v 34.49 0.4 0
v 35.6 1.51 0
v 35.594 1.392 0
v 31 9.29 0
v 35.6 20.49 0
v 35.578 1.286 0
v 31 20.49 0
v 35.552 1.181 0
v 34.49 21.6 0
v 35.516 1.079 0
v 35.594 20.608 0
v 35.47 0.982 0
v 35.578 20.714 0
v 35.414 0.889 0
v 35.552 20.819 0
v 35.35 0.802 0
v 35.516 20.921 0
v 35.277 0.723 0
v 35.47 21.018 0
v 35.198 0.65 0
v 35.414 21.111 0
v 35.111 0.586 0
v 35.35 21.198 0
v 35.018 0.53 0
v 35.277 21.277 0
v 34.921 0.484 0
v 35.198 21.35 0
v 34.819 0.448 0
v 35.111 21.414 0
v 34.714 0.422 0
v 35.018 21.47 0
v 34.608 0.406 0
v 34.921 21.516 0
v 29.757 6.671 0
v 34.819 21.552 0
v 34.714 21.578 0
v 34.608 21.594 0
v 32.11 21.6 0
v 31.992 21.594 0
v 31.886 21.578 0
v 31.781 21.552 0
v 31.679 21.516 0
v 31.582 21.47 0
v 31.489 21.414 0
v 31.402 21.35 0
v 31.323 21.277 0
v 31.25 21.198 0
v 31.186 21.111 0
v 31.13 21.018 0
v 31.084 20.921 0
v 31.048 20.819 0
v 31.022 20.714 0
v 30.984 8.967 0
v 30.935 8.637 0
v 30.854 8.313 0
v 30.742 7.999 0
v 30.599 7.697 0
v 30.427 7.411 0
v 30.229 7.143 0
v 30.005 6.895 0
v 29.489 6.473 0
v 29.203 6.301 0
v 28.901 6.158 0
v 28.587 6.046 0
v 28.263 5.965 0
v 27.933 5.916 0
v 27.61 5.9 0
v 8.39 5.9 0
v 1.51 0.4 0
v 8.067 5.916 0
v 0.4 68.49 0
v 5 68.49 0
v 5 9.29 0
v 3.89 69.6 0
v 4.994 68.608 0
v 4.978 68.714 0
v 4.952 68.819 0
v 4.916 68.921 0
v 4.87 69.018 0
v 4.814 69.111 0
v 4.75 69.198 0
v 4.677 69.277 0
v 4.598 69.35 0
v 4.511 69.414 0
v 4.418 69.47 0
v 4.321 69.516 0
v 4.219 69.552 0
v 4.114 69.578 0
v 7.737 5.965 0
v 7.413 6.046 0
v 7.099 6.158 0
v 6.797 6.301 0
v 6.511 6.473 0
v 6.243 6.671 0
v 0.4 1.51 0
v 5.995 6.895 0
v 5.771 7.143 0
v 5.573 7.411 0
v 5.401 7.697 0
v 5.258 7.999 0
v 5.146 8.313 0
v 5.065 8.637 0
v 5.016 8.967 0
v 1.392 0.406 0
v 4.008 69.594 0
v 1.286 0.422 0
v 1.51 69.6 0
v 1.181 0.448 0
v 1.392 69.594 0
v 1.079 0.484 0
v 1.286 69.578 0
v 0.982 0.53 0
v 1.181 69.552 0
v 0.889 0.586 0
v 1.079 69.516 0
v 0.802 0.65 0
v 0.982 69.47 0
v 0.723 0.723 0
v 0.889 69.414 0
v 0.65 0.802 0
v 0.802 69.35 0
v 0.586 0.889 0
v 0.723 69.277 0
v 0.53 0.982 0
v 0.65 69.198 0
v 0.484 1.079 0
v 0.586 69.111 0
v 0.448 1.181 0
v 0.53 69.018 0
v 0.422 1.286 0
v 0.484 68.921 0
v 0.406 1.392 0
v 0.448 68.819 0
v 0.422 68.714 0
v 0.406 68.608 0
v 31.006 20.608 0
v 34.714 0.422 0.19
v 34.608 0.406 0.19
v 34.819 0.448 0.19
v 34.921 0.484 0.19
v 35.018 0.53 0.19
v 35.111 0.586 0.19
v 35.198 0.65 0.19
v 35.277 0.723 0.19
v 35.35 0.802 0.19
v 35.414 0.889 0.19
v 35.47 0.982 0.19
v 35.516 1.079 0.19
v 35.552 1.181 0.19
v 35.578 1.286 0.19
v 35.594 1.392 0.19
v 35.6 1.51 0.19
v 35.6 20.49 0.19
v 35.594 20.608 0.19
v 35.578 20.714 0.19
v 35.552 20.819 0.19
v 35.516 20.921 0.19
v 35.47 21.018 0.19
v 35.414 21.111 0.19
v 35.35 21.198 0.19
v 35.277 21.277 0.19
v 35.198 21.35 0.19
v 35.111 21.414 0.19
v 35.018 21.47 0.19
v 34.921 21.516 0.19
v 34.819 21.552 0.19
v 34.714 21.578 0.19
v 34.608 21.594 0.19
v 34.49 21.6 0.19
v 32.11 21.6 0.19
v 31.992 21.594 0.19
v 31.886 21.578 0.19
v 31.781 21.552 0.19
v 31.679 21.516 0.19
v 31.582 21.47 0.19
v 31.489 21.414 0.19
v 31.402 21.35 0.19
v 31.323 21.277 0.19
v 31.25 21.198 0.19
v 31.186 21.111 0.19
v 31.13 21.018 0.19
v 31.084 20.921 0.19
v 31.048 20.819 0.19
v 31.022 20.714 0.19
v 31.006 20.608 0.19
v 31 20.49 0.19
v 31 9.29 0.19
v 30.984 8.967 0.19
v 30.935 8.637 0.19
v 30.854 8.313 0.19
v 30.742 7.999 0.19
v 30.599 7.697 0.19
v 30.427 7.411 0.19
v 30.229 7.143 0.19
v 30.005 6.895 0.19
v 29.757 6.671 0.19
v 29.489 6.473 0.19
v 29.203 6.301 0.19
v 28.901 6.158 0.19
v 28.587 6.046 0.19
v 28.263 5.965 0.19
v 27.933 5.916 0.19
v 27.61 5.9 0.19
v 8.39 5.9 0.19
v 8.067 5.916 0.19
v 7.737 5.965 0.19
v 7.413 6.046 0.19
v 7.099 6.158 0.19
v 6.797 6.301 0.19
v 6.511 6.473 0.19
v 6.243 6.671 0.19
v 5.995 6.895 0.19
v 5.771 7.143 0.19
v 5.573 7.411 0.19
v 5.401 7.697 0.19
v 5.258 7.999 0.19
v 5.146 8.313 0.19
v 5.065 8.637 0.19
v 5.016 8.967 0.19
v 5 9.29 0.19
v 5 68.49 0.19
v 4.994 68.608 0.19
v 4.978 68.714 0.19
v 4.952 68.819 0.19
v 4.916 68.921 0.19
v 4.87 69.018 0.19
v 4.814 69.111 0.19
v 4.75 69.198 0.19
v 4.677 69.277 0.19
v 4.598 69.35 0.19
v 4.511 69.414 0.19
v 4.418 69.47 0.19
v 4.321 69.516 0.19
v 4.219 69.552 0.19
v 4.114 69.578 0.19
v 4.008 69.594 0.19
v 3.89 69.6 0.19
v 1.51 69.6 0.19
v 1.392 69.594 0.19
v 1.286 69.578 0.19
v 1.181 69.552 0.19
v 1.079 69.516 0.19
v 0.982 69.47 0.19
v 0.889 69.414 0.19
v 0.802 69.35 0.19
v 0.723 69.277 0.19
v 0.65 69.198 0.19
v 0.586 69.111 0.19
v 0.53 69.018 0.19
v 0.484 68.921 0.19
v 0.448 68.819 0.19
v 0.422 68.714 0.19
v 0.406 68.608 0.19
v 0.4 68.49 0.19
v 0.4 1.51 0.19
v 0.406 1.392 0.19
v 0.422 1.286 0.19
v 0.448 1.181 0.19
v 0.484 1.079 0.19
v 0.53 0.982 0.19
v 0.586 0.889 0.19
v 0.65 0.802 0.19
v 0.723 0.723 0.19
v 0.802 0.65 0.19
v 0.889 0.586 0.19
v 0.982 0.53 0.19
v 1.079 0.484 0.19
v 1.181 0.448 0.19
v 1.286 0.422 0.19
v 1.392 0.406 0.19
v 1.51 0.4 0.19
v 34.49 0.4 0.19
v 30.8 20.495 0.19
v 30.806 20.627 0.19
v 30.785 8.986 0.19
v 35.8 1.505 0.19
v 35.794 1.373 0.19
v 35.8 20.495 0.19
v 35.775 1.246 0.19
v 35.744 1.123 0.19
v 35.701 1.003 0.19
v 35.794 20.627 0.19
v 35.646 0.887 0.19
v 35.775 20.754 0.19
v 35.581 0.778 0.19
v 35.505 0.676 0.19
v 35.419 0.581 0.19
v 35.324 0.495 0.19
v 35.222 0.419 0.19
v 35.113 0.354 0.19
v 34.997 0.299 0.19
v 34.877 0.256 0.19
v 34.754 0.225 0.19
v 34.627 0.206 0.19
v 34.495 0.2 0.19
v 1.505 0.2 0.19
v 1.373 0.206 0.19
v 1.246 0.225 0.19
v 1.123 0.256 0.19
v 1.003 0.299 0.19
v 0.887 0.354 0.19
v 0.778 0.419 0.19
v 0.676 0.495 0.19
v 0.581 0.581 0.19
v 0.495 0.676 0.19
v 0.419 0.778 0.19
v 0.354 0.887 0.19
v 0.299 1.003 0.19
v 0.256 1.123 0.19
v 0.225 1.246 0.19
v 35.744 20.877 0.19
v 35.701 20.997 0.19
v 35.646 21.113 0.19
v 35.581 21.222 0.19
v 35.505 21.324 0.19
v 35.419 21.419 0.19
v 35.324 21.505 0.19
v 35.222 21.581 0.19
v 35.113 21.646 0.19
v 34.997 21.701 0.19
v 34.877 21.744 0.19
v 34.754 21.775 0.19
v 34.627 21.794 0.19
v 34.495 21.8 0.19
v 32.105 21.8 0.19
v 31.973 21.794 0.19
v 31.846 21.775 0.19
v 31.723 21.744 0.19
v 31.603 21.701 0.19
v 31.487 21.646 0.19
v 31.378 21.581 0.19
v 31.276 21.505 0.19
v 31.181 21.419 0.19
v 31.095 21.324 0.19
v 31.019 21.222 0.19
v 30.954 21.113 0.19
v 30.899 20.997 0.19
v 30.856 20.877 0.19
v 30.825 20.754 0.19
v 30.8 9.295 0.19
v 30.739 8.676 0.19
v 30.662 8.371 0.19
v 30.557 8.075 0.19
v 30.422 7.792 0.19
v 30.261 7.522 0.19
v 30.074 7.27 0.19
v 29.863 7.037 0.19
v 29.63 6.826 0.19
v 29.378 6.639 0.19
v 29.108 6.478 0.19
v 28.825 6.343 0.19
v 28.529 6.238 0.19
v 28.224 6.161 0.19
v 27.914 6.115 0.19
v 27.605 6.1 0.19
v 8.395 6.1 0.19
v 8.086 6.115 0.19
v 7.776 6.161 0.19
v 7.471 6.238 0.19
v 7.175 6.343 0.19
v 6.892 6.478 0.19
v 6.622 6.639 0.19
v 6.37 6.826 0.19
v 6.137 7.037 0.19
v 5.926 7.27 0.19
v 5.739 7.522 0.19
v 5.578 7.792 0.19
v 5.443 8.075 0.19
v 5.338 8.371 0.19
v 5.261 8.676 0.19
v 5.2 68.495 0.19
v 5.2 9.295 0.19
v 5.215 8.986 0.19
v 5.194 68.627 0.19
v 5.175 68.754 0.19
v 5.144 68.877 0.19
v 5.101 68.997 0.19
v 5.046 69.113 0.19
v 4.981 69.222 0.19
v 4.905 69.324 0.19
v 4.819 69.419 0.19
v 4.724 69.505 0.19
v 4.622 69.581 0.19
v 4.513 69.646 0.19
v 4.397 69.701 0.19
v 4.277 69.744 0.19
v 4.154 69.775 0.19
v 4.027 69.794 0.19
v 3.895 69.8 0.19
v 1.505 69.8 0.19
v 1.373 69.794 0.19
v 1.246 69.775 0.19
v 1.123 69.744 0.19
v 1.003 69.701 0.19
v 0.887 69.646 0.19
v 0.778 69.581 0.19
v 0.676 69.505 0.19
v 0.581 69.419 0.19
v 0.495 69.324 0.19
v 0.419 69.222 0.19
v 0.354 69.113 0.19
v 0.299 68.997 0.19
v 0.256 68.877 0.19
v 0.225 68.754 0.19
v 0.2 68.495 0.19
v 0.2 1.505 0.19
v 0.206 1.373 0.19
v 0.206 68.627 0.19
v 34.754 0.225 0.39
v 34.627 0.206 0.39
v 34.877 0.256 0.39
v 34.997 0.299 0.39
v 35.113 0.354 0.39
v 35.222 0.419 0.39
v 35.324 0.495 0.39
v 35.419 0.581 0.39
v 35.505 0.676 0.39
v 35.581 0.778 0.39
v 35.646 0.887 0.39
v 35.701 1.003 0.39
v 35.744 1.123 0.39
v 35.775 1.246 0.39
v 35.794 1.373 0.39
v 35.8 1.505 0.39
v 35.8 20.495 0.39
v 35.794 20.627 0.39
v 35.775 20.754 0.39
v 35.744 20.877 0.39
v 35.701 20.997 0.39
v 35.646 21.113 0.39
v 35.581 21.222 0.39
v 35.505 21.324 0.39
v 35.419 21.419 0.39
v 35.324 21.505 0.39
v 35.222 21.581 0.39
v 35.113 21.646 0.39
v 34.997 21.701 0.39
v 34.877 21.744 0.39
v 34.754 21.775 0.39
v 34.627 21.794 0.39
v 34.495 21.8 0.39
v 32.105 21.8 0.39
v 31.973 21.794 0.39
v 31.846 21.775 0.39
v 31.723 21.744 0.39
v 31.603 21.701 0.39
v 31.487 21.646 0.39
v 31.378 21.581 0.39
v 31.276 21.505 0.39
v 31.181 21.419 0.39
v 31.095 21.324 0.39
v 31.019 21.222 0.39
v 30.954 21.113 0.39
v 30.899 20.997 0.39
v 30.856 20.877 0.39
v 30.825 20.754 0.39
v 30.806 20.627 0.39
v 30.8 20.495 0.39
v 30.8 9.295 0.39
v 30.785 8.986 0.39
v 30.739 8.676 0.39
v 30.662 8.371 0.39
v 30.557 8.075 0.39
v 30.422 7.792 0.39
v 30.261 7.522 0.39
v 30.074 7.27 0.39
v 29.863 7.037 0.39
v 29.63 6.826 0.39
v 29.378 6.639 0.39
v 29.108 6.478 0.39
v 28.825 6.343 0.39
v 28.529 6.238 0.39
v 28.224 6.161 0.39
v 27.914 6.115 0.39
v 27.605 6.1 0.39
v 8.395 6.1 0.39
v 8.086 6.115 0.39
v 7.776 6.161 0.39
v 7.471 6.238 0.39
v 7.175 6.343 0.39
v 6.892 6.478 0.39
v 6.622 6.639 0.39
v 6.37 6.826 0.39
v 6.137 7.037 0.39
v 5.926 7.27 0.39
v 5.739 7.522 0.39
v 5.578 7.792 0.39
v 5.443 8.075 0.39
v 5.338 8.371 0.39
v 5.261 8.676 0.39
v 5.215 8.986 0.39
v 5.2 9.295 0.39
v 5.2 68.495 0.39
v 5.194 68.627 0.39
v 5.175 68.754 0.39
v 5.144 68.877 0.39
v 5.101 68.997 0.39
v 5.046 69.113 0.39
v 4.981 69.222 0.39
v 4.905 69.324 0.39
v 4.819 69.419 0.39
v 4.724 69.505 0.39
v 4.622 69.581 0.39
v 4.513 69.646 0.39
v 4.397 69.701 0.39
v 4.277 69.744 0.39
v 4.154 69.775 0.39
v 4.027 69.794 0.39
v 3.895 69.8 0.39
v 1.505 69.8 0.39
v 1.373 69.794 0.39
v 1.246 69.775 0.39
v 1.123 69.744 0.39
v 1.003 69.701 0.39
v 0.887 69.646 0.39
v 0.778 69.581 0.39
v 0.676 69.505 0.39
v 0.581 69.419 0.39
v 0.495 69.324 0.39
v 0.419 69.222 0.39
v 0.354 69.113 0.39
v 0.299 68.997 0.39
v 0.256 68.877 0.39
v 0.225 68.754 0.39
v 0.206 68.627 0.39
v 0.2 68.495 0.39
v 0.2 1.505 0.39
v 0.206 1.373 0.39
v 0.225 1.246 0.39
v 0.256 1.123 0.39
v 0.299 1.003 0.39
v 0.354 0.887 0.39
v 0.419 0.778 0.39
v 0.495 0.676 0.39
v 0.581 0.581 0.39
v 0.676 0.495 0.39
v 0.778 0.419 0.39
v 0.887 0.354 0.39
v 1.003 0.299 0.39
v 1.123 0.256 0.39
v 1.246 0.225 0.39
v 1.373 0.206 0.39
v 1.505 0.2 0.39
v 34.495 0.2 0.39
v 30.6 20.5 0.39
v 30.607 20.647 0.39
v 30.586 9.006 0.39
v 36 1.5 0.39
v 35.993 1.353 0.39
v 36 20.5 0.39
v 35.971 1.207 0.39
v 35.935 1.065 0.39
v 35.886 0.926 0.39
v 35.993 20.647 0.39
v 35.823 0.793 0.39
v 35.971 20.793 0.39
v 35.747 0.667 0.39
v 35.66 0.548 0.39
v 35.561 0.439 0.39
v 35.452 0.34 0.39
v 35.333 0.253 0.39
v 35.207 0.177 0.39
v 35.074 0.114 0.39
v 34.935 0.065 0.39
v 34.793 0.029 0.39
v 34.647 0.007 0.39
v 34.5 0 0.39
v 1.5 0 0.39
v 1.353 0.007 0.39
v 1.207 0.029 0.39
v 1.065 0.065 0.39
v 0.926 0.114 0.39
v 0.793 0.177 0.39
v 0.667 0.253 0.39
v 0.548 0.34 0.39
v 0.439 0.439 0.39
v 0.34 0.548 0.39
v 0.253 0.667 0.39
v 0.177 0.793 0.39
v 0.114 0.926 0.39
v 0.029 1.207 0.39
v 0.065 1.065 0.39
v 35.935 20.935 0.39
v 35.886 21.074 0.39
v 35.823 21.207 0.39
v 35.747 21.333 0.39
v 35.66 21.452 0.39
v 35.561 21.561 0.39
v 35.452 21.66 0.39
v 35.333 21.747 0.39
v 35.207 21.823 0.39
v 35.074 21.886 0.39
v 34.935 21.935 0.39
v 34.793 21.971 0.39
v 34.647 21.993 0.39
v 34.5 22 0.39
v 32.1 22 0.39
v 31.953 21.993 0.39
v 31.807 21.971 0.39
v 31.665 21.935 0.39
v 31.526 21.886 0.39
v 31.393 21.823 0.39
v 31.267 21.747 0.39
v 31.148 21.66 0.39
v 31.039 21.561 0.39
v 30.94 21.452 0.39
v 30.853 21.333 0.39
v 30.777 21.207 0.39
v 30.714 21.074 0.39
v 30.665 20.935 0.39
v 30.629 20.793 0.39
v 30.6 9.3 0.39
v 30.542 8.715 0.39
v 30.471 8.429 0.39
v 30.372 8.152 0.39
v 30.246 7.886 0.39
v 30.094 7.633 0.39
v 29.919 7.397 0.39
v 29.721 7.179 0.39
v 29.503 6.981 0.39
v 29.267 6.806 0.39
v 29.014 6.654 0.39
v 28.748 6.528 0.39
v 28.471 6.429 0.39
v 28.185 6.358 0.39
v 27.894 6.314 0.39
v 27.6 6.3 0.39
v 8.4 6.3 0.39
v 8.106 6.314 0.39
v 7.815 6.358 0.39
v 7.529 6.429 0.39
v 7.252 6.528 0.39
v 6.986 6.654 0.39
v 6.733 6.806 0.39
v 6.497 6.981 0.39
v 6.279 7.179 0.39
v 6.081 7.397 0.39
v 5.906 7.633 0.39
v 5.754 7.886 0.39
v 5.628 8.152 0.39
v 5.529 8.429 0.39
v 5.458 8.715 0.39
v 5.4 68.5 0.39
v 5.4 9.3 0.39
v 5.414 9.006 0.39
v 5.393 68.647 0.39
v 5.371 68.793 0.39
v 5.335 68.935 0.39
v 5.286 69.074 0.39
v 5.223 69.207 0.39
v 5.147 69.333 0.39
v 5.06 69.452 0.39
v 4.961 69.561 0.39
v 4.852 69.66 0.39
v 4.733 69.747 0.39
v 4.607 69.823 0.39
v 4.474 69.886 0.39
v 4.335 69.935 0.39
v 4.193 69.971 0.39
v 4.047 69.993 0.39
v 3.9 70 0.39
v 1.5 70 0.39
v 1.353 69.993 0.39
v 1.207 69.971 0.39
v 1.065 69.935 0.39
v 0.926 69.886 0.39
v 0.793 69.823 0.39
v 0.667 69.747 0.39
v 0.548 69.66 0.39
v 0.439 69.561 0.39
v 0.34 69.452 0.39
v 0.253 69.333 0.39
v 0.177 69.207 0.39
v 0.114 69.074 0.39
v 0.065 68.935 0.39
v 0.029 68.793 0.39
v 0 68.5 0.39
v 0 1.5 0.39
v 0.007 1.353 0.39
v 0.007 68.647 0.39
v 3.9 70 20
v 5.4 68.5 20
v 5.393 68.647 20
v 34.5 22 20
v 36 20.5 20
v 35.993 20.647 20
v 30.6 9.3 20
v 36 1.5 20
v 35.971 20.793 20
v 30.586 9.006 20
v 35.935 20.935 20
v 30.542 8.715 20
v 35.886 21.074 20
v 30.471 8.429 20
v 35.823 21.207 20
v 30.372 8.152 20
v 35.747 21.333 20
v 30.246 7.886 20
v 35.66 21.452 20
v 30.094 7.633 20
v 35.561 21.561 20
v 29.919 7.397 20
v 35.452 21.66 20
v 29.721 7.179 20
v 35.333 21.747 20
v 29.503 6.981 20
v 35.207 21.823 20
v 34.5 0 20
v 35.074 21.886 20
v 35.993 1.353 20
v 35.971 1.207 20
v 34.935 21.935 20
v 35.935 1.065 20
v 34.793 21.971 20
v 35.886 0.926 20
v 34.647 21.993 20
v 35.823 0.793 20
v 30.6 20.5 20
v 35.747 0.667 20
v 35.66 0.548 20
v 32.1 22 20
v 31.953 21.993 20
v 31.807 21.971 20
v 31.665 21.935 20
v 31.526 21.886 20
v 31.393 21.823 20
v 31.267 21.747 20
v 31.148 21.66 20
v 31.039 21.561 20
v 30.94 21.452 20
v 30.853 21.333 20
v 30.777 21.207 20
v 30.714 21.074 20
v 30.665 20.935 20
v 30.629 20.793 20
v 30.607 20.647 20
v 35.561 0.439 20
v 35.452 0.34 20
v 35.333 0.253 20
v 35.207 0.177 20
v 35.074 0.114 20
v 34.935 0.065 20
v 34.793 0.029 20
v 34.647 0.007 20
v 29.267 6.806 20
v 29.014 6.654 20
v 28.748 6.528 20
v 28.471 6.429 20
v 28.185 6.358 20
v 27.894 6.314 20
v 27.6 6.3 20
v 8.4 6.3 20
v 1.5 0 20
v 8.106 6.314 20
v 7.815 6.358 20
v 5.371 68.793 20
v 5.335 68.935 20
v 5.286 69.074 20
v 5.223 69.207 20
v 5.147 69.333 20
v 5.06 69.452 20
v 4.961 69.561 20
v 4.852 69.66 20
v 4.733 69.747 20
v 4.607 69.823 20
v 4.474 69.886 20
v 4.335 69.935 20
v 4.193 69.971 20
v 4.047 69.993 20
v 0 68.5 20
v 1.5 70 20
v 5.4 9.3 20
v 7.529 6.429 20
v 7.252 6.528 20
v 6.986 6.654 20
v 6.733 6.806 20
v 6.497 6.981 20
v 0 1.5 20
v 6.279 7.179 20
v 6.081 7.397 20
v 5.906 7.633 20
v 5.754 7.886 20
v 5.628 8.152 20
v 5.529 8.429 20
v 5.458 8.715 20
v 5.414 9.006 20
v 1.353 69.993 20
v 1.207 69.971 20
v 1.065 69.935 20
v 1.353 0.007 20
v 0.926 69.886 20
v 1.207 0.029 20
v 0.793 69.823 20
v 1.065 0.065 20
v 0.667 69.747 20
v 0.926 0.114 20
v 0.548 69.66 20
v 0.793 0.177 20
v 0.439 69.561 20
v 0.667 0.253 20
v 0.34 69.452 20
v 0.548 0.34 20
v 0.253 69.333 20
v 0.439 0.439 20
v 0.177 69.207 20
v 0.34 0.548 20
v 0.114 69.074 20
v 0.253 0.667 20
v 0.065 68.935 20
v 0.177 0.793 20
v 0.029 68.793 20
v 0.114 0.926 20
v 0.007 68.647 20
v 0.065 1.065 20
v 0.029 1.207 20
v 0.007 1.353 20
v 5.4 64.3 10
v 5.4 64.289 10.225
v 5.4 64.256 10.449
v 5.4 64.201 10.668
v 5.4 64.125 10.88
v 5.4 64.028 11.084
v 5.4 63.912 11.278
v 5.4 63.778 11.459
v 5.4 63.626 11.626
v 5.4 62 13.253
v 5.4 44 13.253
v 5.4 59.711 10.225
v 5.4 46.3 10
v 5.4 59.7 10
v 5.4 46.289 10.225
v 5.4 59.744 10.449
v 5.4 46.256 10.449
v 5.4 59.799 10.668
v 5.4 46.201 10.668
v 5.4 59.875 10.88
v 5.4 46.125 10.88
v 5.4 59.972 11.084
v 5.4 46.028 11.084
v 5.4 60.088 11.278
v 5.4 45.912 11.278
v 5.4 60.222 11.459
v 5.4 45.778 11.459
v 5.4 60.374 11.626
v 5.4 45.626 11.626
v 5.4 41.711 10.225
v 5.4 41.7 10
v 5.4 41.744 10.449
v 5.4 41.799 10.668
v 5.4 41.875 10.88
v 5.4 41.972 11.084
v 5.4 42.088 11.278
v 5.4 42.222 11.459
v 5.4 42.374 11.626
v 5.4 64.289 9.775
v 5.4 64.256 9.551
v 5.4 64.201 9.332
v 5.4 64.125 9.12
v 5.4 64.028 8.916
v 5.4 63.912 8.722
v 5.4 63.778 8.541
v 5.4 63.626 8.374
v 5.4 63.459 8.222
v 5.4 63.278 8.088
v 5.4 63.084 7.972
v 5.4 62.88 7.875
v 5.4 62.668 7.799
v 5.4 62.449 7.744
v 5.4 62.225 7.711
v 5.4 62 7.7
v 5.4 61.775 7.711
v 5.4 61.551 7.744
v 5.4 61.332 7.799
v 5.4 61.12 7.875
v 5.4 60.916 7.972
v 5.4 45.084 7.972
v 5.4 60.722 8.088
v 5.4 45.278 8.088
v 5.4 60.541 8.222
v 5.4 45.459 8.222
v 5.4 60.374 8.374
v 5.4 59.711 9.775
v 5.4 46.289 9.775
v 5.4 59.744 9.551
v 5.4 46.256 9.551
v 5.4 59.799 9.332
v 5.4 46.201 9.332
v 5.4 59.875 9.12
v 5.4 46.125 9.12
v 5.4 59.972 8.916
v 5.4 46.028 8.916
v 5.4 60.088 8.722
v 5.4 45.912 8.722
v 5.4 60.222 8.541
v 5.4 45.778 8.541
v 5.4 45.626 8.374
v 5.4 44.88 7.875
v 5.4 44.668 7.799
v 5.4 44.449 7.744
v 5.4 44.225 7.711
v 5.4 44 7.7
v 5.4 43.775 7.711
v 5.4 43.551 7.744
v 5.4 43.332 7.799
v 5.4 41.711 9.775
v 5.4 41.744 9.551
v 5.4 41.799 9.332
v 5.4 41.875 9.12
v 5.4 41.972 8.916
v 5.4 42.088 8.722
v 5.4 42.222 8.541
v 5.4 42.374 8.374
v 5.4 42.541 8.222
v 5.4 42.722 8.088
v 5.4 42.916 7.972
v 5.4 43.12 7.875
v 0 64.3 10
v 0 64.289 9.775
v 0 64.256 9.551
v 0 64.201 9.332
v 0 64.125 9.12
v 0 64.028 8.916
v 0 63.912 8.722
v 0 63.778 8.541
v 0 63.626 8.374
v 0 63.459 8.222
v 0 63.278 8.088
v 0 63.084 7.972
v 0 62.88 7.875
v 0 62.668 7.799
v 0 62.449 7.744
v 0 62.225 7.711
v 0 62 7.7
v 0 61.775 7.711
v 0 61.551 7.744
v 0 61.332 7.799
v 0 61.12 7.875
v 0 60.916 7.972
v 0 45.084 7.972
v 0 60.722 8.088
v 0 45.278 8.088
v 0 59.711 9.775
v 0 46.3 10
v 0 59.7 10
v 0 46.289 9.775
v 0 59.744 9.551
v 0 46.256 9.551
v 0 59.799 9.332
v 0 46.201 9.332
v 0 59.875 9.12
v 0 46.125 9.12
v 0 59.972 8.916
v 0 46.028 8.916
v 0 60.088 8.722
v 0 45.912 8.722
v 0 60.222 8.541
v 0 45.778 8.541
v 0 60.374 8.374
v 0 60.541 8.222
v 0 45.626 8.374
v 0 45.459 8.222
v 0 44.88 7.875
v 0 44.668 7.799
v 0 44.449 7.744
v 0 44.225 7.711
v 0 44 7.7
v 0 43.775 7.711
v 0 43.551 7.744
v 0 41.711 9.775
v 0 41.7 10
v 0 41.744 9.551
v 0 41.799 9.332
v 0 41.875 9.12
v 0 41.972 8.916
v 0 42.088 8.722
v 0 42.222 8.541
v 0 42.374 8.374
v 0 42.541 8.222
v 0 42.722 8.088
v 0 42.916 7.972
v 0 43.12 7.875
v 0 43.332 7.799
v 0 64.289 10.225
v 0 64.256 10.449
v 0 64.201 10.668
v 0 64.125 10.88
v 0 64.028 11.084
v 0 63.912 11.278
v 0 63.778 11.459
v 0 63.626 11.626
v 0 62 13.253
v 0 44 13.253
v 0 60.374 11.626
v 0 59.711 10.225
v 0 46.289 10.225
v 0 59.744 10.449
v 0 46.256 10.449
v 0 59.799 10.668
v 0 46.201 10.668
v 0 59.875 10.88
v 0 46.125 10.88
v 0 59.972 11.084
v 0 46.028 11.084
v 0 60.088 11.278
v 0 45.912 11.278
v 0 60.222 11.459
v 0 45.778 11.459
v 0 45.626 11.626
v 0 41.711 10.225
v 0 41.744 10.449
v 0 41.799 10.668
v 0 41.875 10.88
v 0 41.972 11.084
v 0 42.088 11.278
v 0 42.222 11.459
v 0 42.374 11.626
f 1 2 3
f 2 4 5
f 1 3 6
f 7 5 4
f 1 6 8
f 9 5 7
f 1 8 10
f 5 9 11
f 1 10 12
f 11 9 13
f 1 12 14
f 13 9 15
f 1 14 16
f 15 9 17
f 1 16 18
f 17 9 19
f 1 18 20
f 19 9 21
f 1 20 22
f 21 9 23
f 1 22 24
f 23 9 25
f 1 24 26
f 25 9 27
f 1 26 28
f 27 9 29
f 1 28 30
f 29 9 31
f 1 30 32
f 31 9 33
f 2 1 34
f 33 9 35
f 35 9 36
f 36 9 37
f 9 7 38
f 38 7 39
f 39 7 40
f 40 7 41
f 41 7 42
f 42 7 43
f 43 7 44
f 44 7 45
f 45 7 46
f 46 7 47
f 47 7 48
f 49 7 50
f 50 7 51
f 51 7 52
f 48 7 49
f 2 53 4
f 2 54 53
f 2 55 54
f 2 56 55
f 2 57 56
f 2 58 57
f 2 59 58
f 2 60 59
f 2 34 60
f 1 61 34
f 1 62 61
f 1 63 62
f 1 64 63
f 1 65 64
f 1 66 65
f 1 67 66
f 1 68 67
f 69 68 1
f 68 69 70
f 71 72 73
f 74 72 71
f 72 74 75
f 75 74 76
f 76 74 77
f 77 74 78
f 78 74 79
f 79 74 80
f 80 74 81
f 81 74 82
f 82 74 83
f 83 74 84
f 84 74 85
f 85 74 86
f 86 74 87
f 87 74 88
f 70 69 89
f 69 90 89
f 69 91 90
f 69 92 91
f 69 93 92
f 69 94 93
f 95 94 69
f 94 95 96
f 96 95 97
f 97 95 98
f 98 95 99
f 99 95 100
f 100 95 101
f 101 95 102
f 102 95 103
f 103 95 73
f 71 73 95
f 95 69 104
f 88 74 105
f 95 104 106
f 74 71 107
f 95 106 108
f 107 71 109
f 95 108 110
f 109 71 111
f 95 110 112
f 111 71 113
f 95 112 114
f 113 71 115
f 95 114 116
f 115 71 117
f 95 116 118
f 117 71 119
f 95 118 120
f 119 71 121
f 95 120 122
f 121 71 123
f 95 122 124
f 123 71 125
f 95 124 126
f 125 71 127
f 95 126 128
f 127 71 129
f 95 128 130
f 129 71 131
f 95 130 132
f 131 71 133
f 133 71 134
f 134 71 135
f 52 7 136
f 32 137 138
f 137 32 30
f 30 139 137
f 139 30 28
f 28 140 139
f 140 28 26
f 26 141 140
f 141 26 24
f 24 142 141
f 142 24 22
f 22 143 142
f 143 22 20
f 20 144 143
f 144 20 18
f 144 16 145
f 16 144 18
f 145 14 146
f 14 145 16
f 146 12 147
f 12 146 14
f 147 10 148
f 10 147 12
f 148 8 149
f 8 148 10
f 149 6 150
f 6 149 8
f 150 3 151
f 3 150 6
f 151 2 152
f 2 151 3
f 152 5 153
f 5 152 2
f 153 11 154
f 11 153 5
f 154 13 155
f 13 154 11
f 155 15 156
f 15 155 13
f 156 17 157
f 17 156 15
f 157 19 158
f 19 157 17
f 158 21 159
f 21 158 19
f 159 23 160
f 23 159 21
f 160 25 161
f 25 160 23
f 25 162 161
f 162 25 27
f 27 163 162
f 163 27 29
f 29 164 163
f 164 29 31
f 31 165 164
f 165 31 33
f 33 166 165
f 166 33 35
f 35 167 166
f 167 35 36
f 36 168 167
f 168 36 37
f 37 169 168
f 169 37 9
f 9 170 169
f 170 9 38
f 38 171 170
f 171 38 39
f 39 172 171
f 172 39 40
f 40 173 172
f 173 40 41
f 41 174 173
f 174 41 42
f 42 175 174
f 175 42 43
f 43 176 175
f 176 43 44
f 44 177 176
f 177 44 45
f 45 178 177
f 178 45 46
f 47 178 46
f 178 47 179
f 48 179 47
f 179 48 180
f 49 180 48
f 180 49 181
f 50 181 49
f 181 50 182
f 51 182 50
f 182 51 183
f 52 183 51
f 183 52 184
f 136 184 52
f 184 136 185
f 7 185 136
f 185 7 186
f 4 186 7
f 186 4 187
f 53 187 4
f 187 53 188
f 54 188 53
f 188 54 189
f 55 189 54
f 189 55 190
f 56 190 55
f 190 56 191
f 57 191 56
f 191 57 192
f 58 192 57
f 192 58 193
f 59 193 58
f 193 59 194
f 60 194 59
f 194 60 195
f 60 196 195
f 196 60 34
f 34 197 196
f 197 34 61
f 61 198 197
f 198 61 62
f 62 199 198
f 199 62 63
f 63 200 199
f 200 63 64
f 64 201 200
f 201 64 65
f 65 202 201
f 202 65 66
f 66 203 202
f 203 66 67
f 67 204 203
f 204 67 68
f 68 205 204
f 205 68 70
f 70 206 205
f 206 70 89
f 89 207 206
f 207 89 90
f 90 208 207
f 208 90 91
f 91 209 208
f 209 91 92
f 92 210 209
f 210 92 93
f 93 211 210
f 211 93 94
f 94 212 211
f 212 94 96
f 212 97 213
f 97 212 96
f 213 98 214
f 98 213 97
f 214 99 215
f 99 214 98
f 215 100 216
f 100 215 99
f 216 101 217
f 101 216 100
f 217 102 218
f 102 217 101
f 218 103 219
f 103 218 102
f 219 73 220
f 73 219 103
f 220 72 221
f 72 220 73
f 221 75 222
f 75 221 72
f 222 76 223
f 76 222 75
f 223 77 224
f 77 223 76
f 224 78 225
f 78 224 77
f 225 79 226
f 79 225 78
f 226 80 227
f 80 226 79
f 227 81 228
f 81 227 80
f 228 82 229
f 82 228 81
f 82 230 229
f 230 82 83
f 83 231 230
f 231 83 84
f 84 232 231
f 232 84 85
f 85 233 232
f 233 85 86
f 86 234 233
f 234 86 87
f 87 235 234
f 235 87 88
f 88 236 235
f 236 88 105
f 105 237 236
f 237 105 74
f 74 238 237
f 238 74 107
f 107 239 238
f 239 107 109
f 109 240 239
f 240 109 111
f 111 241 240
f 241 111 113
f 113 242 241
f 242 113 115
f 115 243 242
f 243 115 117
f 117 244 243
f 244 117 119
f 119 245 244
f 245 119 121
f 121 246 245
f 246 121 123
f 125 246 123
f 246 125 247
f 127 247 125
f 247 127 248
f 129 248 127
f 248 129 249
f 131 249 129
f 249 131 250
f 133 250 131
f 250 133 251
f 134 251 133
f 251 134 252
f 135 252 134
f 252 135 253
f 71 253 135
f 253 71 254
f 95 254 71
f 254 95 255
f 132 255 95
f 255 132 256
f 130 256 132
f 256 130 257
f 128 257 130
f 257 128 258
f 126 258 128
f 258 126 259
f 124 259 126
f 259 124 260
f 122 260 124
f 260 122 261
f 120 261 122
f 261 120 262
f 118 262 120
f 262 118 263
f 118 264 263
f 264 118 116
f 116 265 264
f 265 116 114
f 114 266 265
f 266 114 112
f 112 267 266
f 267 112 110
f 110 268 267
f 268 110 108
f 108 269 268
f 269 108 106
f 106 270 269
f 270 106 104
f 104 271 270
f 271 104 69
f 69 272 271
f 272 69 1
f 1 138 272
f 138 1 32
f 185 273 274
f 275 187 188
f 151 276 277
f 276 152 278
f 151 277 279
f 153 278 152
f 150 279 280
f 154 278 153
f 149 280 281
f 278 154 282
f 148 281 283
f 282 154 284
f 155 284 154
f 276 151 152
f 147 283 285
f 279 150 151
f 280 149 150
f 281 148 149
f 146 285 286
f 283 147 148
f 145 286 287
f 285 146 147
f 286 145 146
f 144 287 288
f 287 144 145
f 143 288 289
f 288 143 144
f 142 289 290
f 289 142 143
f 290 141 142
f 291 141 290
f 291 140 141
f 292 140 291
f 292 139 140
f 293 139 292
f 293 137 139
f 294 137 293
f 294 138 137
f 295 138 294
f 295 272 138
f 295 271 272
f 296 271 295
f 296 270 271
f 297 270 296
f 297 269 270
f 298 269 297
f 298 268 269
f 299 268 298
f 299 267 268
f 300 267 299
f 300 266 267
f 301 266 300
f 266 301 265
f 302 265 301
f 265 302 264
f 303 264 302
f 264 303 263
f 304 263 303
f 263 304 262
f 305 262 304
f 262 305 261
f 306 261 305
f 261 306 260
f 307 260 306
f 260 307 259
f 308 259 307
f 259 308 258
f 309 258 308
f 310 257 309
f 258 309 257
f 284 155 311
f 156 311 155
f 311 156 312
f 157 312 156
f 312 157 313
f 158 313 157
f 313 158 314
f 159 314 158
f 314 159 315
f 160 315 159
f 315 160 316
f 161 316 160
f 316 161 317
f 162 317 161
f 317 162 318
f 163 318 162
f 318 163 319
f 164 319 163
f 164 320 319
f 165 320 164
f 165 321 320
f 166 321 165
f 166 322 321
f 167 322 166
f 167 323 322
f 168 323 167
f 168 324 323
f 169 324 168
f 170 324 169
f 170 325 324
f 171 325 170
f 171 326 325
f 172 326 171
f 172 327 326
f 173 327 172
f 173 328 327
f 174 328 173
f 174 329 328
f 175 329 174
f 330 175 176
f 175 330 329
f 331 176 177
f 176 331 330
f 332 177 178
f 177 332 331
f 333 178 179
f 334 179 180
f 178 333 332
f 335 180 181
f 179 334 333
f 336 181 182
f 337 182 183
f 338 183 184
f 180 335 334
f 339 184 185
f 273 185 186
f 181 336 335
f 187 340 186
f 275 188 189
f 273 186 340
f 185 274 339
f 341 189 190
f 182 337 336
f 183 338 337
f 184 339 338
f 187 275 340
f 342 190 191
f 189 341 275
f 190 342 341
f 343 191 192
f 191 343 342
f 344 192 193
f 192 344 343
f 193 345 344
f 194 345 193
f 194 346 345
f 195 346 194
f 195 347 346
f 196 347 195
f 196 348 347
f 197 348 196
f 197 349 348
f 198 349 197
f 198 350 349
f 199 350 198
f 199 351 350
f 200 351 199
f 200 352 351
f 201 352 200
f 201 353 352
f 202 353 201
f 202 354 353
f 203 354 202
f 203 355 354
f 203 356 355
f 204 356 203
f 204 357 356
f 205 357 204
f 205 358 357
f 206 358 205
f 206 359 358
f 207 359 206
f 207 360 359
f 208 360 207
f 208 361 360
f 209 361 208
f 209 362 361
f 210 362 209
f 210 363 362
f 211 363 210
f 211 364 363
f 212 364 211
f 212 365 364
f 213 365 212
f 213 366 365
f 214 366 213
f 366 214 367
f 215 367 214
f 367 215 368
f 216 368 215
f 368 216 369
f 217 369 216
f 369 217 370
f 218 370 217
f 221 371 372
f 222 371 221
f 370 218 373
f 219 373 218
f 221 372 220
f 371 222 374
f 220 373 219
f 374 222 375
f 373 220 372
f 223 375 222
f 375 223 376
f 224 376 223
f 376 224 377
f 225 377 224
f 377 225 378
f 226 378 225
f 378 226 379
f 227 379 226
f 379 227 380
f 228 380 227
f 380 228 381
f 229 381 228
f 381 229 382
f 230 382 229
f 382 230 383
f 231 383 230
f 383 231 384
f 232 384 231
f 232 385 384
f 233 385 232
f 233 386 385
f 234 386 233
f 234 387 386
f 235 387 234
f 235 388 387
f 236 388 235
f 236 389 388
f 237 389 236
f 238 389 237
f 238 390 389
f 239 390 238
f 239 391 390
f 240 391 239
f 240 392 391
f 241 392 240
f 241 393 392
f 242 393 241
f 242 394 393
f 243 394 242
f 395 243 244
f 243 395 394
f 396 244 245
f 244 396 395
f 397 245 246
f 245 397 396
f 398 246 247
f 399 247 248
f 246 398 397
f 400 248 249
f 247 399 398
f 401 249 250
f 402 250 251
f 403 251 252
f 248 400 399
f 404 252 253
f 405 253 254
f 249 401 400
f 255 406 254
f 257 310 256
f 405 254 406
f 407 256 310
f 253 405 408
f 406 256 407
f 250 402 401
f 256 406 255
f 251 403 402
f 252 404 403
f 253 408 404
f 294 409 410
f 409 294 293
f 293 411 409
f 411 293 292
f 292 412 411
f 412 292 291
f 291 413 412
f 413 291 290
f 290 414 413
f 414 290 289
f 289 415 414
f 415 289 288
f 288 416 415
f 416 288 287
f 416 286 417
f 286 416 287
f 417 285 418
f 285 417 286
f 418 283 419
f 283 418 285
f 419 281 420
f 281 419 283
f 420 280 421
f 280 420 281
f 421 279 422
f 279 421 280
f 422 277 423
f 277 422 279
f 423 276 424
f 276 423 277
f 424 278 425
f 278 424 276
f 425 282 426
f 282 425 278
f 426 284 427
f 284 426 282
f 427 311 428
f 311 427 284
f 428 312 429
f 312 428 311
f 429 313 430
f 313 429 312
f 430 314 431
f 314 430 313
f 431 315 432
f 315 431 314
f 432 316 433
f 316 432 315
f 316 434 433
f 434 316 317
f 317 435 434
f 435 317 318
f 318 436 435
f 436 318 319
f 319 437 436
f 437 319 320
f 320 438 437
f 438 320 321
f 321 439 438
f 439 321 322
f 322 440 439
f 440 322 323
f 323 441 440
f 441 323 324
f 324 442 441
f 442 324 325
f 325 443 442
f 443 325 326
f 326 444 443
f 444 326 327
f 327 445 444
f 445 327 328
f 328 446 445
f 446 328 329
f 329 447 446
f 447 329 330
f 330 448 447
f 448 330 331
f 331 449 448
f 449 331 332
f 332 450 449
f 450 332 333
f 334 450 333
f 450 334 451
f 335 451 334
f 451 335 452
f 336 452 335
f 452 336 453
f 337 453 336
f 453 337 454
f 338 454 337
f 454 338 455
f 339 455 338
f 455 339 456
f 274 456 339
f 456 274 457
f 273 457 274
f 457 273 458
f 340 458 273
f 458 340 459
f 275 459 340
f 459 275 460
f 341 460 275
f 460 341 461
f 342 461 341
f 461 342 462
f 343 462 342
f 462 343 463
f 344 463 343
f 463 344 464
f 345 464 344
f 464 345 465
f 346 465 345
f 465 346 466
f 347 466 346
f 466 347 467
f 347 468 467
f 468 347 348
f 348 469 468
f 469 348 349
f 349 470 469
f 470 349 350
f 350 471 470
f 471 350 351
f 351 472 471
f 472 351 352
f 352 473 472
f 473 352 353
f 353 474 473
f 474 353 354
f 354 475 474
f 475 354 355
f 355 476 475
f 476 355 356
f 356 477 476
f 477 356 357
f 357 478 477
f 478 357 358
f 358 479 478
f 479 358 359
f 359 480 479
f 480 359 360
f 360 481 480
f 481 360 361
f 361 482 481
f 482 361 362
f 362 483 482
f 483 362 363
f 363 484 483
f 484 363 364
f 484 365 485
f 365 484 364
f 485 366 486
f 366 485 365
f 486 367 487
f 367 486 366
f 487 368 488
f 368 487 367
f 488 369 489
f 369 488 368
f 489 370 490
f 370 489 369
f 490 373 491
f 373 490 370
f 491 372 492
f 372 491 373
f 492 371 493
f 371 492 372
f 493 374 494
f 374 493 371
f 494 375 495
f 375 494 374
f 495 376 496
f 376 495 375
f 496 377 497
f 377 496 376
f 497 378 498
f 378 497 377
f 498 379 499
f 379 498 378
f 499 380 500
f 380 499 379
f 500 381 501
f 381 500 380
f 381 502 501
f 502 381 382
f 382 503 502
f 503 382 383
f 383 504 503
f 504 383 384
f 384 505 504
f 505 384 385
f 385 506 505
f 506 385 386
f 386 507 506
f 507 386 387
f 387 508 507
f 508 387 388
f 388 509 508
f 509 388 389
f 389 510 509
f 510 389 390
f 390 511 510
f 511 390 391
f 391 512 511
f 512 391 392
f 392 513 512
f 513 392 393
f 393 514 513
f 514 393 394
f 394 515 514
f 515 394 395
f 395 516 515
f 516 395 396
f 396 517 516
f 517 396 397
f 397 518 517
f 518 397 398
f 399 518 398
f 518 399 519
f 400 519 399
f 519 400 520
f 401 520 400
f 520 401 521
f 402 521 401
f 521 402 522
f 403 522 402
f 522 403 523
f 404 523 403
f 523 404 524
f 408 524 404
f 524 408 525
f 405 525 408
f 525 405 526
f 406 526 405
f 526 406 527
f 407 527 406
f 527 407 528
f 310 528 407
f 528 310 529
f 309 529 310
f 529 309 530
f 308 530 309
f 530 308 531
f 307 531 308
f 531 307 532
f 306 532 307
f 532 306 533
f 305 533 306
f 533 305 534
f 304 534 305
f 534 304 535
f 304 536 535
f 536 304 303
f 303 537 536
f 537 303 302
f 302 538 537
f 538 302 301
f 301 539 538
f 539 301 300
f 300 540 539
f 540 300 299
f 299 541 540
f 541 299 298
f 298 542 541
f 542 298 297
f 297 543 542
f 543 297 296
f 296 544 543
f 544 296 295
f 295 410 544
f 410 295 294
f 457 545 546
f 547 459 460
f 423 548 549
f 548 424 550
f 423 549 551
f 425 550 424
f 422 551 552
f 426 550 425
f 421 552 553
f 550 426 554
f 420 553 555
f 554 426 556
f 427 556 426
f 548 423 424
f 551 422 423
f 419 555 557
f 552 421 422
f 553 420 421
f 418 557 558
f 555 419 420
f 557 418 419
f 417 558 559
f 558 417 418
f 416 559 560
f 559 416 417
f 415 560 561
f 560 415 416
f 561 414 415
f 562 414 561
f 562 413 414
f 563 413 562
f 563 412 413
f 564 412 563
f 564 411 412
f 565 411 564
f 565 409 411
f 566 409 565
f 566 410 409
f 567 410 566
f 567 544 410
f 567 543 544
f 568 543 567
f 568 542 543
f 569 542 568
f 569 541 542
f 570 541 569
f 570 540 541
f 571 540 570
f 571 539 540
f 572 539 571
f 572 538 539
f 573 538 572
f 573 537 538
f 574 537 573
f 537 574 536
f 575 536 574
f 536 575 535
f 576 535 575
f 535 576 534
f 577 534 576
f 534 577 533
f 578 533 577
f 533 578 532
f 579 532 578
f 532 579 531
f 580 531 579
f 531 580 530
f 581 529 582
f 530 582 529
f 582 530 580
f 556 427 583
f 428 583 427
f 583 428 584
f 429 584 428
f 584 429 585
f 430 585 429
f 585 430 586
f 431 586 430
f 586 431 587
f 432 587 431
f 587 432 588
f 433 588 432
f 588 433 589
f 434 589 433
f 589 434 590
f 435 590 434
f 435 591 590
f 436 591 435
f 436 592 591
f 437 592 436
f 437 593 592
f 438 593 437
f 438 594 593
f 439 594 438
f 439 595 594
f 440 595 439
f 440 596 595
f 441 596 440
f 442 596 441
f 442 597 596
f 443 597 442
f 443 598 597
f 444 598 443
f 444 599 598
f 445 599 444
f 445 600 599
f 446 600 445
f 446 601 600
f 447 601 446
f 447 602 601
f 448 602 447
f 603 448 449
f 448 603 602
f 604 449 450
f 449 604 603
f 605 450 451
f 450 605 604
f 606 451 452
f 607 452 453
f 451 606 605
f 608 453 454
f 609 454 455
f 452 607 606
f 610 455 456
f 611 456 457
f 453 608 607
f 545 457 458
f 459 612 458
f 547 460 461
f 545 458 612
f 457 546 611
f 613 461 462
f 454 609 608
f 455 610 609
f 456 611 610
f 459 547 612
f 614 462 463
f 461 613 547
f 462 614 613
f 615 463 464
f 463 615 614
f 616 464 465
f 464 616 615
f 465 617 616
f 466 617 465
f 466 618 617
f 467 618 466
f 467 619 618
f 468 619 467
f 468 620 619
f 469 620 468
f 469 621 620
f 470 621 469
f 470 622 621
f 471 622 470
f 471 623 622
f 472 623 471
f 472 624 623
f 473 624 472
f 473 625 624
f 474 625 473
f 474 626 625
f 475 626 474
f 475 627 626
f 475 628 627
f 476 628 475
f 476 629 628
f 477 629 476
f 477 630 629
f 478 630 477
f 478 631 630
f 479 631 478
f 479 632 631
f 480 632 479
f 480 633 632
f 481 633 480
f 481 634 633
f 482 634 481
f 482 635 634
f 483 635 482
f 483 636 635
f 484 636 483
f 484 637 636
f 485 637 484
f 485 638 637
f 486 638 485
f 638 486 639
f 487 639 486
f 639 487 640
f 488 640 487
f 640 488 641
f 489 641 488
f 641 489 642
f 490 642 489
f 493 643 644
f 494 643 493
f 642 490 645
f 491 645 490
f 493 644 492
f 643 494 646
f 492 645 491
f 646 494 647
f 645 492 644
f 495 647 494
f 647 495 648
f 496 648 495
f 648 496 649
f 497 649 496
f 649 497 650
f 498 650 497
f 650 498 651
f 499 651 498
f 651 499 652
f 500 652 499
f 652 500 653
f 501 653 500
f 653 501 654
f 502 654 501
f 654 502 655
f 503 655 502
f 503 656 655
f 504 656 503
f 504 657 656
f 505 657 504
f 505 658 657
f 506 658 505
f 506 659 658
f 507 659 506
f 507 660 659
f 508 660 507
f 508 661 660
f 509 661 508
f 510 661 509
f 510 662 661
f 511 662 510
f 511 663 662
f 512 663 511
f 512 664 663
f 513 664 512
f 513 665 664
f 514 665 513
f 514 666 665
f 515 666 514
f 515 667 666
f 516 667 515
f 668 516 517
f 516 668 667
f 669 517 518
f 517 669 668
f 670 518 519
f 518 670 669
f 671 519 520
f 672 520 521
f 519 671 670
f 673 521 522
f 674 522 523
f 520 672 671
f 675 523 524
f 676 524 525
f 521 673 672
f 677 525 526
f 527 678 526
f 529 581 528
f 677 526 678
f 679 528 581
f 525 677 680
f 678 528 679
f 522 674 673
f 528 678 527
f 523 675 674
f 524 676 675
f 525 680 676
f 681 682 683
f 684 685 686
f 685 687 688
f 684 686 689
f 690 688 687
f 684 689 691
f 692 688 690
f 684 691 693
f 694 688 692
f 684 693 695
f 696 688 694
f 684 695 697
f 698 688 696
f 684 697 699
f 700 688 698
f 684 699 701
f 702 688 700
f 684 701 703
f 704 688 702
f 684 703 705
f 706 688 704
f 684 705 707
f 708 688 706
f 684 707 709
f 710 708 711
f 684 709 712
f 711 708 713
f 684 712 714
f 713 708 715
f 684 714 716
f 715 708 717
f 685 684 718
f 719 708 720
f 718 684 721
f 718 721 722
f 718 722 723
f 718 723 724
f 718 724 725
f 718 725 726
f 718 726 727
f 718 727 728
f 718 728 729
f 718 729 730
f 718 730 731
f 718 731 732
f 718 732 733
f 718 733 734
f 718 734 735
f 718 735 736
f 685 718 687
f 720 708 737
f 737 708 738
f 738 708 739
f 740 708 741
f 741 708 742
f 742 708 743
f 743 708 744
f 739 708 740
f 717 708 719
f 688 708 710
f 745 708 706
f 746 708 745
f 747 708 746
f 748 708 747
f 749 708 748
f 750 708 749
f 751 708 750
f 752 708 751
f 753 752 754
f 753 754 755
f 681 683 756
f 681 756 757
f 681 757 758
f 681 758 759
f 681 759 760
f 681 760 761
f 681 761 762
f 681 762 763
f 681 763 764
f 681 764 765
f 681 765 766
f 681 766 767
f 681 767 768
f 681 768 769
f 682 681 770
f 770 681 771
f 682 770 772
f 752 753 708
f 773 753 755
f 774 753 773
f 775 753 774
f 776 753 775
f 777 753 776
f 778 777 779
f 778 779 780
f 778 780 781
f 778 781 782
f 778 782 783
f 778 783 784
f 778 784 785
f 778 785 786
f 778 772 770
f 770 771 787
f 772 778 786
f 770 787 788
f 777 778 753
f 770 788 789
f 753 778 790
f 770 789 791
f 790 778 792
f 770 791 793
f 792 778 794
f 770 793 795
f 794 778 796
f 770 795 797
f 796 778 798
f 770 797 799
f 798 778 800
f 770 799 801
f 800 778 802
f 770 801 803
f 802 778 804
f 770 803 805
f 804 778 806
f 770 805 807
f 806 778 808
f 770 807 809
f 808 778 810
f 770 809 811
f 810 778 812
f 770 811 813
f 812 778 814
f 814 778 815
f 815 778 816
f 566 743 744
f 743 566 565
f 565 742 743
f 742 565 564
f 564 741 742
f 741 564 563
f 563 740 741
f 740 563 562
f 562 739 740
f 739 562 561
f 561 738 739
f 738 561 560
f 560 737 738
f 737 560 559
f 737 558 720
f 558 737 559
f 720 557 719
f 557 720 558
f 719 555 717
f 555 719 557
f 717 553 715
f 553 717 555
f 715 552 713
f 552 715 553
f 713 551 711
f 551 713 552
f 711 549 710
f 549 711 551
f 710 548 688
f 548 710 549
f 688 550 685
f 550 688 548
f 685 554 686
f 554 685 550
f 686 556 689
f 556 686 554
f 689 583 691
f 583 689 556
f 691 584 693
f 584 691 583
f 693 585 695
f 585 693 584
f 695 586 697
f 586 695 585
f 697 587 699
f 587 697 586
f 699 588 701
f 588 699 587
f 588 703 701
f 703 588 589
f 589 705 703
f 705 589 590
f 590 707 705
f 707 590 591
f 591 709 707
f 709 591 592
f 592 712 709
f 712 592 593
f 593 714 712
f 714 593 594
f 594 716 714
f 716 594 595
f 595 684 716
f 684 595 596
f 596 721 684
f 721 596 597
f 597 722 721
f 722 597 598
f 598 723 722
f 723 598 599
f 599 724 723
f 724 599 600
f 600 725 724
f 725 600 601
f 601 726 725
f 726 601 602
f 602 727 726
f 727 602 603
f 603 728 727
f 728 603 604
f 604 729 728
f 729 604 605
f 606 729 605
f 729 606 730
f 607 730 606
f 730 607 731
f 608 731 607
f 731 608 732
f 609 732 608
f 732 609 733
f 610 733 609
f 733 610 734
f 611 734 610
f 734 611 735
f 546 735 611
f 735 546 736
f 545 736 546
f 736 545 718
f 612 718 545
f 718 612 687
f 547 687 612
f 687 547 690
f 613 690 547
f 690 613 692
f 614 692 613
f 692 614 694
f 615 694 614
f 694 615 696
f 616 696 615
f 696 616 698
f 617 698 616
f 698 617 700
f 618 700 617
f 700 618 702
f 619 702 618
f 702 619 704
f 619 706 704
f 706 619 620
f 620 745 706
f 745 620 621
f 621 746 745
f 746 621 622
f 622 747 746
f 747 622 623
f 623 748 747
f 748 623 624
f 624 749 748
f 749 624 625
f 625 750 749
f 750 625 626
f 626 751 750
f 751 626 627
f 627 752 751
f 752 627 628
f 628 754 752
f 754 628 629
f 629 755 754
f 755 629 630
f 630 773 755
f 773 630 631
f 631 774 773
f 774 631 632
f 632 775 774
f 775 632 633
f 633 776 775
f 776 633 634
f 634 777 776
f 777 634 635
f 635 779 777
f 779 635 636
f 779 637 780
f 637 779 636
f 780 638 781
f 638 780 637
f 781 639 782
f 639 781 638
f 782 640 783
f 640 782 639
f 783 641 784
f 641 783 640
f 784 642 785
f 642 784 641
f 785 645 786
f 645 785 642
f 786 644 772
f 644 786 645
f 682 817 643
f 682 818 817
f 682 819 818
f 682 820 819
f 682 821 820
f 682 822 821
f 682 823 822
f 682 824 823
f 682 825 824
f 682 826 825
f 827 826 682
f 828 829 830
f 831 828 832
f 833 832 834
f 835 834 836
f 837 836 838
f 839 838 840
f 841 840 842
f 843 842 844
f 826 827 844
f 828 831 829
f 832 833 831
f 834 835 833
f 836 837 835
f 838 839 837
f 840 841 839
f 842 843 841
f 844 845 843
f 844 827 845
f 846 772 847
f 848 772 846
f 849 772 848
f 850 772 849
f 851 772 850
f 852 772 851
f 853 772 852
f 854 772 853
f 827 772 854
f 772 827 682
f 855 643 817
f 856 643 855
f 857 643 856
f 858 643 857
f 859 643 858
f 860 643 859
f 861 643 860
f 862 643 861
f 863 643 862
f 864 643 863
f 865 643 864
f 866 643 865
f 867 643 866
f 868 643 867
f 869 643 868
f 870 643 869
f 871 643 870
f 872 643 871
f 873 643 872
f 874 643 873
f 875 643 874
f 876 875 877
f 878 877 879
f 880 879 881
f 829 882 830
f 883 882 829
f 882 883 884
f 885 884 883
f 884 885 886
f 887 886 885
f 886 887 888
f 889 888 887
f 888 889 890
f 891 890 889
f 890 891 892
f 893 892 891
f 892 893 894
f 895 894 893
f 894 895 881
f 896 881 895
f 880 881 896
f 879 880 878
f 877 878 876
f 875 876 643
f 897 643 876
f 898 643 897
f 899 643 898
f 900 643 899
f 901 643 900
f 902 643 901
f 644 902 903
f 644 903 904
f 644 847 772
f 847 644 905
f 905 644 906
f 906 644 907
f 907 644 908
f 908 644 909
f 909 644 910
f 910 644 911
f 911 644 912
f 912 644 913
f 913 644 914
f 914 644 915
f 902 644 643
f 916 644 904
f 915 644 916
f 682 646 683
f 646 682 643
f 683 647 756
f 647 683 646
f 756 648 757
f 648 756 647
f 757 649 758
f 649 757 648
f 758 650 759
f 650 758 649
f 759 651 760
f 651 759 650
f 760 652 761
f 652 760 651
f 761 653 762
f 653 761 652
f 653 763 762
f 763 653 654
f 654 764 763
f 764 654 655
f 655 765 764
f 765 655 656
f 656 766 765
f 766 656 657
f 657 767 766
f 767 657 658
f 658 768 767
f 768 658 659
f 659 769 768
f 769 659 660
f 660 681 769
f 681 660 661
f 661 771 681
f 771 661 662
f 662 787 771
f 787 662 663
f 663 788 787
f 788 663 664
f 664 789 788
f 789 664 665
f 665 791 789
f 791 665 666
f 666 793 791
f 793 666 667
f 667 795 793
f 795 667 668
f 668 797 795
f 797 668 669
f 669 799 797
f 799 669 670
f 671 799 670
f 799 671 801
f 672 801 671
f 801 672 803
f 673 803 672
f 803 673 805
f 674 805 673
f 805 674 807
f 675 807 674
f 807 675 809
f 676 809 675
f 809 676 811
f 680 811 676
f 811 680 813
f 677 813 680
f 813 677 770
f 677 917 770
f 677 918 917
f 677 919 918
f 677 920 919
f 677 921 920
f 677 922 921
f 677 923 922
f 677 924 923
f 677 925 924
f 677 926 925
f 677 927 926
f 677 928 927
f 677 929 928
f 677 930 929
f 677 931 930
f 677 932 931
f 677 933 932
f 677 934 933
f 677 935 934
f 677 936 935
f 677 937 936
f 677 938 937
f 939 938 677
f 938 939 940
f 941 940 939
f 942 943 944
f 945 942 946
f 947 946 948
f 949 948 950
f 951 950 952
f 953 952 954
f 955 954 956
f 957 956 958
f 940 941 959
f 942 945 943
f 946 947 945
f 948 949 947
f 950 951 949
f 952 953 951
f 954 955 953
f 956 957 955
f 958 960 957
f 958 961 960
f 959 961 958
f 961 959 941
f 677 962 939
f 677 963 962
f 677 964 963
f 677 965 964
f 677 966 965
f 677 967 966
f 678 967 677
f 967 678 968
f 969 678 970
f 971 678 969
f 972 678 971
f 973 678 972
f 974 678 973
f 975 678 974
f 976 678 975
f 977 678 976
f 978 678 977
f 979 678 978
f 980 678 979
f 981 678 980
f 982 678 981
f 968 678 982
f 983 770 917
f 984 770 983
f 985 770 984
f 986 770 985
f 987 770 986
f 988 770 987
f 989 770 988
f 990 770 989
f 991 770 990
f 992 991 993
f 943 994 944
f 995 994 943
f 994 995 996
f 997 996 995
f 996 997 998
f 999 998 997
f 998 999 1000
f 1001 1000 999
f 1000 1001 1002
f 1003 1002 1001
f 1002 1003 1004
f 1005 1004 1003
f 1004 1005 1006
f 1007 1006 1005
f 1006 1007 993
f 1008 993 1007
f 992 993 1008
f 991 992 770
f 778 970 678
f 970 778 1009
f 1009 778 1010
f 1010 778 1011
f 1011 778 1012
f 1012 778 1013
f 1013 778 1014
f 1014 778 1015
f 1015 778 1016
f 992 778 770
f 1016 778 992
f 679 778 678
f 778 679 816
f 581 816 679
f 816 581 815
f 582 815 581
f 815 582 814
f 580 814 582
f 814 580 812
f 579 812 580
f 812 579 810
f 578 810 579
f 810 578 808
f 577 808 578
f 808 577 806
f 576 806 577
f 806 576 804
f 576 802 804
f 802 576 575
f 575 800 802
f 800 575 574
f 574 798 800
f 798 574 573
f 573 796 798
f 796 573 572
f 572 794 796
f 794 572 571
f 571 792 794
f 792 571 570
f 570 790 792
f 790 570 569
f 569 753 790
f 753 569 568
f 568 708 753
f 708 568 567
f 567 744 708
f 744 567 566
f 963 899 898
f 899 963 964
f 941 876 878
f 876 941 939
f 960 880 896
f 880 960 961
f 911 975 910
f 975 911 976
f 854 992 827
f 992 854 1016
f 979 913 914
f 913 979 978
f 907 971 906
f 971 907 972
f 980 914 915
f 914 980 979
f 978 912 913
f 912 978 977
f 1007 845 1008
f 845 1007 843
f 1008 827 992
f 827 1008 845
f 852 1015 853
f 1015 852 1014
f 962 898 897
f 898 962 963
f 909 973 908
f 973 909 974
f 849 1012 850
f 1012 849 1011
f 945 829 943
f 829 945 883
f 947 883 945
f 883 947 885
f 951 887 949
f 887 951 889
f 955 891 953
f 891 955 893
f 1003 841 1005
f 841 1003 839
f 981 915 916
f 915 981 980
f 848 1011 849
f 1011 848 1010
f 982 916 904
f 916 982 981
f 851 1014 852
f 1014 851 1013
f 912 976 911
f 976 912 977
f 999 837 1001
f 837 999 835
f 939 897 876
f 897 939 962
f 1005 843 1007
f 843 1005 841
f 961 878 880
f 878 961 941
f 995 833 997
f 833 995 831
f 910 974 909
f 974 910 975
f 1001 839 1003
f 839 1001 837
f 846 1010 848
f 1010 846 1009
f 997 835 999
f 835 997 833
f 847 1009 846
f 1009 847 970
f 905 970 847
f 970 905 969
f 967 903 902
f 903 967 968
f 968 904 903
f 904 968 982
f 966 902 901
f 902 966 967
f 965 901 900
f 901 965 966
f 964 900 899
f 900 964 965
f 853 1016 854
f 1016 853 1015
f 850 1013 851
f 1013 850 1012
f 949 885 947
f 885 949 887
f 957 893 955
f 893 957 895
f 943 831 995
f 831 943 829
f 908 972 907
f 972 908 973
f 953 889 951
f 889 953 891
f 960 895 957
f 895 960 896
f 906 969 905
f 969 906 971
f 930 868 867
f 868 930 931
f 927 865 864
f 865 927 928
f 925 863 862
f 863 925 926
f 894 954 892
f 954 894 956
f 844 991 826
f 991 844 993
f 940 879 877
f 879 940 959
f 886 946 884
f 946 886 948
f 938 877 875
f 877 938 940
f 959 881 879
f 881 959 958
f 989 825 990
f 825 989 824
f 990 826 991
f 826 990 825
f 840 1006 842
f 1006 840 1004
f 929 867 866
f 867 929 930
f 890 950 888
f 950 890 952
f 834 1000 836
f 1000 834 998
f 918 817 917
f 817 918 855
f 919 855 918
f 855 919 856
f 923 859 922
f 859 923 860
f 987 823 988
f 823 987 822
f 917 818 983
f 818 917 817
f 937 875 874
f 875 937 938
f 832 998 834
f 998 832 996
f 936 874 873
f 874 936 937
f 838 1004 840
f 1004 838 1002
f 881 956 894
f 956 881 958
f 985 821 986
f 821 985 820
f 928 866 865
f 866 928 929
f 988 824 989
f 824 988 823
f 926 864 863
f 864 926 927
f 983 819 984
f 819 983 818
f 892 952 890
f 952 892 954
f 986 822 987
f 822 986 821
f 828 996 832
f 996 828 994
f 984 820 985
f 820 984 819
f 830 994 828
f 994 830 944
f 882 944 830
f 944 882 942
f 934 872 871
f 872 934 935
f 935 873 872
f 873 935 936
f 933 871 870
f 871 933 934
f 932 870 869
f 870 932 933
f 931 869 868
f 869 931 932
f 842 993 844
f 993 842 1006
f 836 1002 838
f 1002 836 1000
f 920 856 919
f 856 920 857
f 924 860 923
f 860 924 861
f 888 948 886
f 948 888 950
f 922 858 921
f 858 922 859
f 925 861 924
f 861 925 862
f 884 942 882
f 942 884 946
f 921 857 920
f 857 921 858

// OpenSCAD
// === DESCRIPTION ===
// Coat hook: a single J-hook screwed to a wall for a heavy winter coat or a bag
// (up to about 3 kg hanging at the hook).
// Physical context: indoors, fixed to a stud with two 4 mm pan-head wood screws.
//   The load hangs in the hook's curve and bends the arm; the back plate presses
//   against the wall below and the top screw carries the pull-out load.
//
// Design decisions:
//   - Printed lying on its side: the hook's side profile is extruded along Z, so
//     the arm bends within the layer plane (along the layers), not across them.
//   - Screw holes are horizontal in this orientation, so they are teardrops with
//     the point up, sized 4 mm + 0.3 compensation + 0.3 free fit.
//   - Inside corners have 3 mm fillets and outside corners 1.5 mm rounds.
//   - The first 0.4 mm is inset in two steps for elephant-foot compensation.
//
// Terminology → code:
//   "back plate"   → plate_t, plate_h, profile()
//   "arm"          → arm_len, arm_t
//   "tip"          → tip_h, tip_t
//   "screw holes"  → screw_d, screw_y, teardrop_hole()
//   "hook width"   → hook_w
//
// Common modifications:
//   Wider hook       → hook_w
//   Heavier load     → arm_t (check bend_stress assert)
//   Deeper hook      → arm_len
//
// Overall dimensions: 36 x 70 x 20 mm (fits a Bambu P1S, 256^3)
// Coordinate system: X = out from the wall, Y = up the wall in use, Z = hook width
// NOTE: Model is in print orientation (on its side). In use, Y is vertical.

// === PRINT SETTINGS ===
// Material: PETG (tough; little creep at room temperature under a 3 kg load)
// Layer Height: 0.2mm
// Walls/Perimeters: 4 (1.8mm)
// Infill: 40% gyroid
// Supports: None required (teardrop holes, profile extruded straight up)
// Orientation: As modeled, lying on its side
// Notes: Dry PETG first; set slicer elephant-foot compensation to 0 (modelled in)

// === PARAMETERS ===
nozzle_diameter = 0.4;
layer_height = 0.2;

hook_w = 20;          // hook width (print Z)
plate_h = 70;         // back plate height
plate_t = 5.4;        // back plate thickness (12 extrusion widths)
arm_len = 36;         // hook depth out from the wall
arm_t = 6.3;          // arm thickness (14 extrusion widths)
tip_h = 22;           // tip height
tip_t = 5.4;          // tip thickness
screw_nominal = 4;    // wood screw size
screw_y = [44, 62];   // screw heights
fillet_r = 3;         // inside corner fillet
round_r = 1.5;        // outside corner round
load_kg = 3;          // design load at the hook

// === DERIVED CONSTANTS ===
extrusion_width = nozzle_diameter * 1.125;
fudge = 0.01;
hole_comp = 0.3;                                    // measured hole compensation
screw_d = screw_nominal + hole_comp + 0.3;          // free-running clearance
ef_chamfer = 0.4;
bend_stress = (load_kg * 9.81 * arm_len) / (hook_w * arm_t * arm_t / 6);   // MPa at the arm root
$fn = $preview ? 32 : 64;

assert(abs(plate_t / extrusion_width - round(plate_t / extrusion_width)) < 1e-6, "plate is whole perimeters");
assert(abs(arm_t / extrusion_width - round(arm_t / extrusion_width)) < 1e-6, "arm is whole perimeters");
assert(bend_stress < 12, "arm root stress stays well under PETG's ~50 MPa");
assert(screw_y[0] - screw_d / 2 > arm_t + fillet_r + 5, "screws clear the arm");
echo(bend_stress_MPa = bend_stress, screw_d = screw_d);

// === MODULES ===
module teardrop_hole(d, h, axis = "y") {
    r = d / 2;
    rotate([0, 0, axis == "x" ? 90 : 0]) rotate([90, 0, 0])
        linear_extrude(height = h, center = true)
            union() { circle(r = r); rotate(45) square(r); }
}

module raw_profile()
    union() {
        square([plate_t, plate_h]);                                // back plate
        square([arm_len, arm_t]);                                  // arm
        translate([arm_len - tip_t, 0]) square([tip_t, tip_h]);    // tip
    }

module profile()
    offset(r = round_r) offset(delta = -round_r)
        offset(r = -fillet_r) offset(delta = fillet_r)
            raw_profile();

module body()
    union() {
        linear_extrude(layer_height) offset(delta = -ef_chamfer) profile();
        translate([0, 0, layer_height - fudge]) linear_extrude(layer_height + fudge) offset(delta = -ef_chamfer / 2) profile();
        translate([0, 0, 2 * layer_height - fudge]) linear_extrude(hook_w - 2 * layer_height + fudge) profile();
    }

// === ASSEMBLY / RENDER ===
difference() {
    body();
    for (y = screw_y) translate([plate_t / 2, y, hook_w / 2]) teardrop_hole(screw_d, plate_t + 2, axis = "x");
}
